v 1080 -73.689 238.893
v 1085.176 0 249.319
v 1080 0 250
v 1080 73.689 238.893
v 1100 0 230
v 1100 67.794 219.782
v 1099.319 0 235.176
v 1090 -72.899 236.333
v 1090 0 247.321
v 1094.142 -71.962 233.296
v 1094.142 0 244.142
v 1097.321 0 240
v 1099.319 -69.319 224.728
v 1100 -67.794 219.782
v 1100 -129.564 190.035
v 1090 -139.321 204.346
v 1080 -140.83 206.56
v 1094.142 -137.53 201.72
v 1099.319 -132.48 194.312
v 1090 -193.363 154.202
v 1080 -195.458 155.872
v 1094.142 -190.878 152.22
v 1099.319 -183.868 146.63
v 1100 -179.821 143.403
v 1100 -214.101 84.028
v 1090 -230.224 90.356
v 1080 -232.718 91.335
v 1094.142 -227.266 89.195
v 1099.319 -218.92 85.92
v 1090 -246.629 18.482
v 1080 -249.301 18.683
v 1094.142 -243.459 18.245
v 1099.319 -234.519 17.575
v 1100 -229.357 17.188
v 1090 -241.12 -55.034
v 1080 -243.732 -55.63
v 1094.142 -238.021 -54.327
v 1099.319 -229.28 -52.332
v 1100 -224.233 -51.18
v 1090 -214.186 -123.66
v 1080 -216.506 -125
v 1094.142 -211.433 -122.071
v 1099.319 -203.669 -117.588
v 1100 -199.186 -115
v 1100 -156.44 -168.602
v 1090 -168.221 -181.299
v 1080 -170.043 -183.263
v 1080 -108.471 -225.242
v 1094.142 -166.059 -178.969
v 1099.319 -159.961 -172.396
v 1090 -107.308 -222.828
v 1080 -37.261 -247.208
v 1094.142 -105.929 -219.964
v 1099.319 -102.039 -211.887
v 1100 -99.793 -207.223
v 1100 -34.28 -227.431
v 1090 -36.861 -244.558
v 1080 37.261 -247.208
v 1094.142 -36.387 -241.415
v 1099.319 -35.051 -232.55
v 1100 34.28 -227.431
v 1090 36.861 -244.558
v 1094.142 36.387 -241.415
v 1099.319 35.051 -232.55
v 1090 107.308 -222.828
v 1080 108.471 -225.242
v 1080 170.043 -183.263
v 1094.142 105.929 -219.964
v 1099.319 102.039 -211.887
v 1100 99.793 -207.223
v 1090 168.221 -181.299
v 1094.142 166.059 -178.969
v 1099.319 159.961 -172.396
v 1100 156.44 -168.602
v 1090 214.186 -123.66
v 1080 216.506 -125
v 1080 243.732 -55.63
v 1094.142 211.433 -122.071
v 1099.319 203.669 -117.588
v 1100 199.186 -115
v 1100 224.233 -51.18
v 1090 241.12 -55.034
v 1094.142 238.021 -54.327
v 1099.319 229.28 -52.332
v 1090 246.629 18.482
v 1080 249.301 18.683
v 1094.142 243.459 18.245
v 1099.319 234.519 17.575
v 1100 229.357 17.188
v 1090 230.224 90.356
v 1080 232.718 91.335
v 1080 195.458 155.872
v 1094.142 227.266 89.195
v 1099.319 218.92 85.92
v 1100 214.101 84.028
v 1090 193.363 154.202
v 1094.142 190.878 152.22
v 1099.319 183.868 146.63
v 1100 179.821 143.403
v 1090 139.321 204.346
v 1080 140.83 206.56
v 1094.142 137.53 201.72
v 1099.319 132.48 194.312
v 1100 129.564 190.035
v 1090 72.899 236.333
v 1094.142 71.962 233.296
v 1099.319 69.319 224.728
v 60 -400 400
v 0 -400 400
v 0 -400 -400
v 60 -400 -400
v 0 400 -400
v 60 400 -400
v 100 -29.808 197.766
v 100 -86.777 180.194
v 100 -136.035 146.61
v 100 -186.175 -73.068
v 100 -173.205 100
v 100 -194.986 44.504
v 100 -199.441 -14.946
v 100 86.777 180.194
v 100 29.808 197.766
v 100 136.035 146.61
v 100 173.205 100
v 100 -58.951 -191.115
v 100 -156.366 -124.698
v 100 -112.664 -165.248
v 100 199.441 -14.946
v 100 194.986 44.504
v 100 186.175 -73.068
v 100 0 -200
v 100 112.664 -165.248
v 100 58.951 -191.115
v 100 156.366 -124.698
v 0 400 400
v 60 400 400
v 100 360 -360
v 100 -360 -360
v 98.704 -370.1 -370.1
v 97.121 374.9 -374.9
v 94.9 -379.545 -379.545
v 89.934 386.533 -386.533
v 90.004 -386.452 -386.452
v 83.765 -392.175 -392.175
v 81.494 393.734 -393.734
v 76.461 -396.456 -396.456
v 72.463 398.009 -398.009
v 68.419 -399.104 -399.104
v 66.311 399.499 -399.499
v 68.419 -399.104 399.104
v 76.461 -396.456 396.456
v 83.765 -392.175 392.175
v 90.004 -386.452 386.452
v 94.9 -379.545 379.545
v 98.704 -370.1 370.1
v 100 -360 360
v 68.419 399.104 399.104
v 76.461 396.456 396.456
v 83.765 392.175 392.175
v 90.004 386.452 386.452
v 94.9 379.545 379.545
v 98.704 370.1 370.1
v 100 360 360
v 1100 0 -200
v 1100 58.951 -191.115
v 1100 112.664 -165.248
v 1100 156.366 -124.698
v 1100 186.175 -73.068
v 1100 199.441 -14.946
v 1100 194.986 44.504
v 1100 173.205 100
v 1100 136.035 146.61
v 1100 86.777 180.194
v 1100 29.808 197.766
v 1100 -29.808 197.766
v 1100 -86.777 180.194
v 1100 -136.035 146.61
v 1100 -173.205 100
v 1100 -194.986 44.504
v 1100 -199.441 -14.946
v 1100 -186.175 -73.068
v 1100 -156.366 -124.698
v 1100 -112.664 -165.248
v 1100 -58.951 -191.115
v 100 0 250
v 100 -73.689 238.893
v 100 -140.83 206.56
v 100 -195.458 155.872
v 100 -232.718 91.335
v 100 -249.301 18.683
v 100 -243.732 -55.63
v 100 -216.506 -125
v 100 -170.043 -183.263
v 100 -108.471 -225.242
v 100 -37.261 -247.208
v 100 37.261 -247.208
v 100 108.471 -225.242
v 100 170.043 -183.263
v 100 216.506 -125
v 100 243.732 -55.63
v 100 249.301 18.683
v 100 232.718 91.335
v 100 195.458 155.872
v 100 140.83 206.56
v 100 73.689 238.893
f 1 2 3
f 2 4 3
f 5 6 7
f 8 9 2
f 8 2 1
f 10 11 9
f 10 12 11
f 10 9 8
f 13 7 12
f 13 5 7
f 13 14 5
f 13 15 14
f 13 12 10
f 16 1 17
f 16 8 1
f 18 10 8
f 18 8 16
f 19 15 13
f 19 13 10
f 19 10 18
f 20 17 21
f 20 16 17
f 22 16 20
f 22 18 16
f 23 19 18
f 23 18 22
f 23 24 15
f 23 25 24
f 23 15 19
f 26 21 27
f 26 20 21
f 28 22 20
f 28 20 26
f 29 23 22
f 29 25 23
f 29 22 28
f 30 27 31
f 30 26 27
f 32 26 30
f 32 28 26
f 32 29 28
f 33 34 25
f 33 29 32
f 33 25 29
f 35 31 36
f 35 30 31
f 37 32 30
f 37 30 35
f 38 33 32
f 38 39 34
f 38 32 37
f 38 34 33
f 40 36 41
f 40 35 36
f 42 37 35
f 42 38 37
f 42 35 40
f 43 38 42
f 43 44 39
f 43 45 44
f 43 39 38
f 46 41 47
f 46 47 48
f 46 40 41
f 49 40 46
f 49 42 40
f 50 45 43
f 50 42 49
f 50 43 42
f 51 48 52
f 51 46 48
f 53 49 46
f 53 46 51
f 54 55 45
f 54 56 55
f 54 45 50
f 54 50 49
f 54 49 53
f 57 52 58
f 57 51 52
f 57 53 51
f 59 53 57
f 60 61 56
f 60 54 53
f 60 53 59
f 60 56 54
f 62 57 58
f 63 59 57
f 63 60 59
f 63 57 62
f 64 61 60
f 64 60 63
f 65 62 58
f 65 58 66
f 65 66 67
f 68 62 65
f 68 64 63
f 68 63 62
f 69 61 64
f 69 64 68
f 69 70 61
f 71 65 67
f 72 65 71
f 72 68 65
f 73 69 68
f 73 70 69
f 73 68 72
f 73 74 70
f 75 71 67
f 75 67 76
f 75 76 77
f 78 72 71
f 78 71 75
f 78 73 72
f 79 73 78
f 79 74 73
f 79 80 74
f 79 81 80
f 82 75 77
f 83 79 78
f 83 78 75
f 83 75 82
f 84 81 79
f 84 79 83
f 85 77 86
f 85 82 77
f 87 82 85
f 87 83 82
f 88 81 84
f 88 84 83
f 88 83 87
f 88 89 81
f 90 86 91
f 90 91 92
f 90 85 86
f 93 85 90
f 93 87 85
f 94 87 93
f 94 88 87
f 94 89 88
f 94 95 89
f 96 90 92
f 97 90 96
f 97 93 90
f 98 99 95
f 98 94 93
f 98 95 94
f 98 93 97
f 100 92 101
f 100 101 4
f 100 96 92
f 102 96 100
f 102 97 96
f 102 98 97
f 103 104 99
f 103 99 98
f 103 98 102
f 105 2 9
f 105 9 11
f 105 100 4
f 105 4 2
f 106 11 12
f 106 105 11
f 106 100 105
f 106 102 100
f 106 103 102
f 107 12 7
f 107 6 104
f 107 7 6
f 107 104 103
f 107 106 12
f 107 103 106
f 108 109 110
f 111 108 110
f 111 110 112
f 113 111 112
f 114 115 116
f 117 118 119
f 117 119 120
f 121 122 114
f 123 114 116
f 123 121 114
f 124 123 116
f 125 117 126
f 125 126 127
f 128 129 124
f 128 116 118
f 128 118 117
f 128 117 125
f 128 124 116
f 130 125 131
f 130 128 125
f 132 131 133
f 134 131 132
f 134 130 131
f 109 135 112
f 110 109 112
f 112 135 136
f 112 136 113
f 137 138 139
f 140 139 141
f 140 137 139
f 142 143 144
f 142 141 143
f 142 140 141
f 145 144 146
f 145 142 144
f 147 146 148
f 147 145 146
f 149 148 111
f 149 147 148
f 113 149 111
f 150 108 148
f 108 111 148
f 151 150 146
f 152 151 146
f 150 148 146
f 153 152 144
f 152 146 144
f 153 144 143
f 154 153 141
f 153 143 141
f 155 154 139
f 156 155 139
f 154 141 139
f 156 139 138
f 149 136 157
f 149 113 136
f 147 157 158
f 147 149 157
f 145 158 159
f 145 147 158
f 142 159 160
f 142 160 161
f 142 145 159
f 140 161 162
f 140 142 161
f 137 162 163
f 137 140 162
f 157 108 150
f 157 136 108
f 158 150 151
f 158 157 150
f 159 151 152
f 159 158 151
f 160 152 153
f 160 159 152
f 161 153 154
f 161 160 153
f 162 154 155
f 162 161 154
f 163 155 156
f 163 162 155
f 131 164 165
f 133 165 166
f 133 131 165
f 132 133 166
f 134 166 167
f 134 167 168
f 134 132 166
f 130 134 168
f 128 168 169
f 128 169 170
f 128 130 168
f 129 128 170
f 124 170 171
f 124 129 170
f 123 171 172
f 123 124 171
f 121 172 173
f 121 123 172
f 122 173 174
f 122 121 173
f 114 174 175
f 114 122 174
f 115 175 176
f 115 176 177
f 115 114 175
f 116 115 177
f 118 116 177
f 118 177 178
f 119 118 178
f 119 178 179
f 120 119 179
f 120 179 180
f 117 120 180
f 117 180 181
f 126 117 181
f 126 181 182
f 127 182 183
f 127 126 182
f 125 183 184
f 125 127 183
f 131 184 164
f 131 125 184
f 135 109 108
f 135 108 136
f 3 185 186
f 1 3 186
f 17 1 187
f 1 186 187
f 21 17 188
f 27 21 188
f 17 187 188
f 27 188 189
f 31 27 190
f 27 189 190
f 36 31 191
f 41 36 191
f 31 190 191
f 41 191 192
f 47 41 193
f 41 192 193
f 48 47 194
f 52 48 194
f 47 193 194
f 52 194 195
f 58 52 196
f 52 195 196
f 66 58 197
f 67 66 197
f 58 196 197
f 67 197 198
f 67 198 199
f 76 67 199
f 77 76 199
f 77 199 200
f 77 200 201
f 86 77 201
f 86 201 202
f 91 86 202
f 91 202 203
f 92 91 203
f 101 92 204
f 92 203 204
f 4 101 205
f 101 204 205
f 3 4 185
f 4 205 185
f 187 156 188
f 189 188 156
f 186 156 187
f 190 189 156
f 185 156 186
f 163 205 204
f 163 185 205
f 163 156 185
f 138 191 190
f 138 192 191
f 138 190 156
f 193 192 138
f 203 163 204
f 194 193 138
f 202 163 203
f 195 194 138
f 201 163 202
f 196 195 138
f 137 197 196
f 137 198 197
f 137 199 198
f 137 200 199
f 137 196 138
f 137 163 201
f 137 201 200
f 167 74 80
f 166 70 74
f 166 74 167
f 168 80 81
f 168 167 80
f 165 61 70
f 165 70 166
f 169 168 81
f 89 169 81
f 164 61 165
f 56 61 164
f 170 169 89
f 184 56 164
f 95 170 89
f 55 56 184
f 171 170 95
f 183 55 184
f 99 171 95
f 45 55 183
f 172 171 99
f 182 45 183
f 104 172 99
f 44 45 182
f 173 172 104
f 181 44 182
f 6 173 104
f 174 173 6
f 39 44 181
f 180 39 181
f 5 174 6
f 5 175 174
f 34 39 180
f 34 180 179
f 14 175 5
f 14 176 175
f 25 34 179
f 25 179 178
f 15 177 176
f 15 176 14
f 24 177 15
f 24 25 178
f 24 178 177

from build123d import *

# Parameters (mm, degrees)
SKETCH3_W           = 800
SKETCH3_H           = 800
BOSS_EXTRUDE1_DEPTH = 100
SKETCH4_R           = 250
SKETCH4_R_2         = 200
BOSS_EXTRUDE2_DEPTH = 1000
FILLET3_R           = 40
FILLET4_R           = 20


with BuildPart() as part:
    # Sketch3 → Boss-Extrude1 (new body)
    with BuildSketch(Plane(origin=(0, 0, 0), x_dir=(0, 0, -1), z_dir=(1, 0, 0))):
        Rectangle(SKETCH3_W, SKETCH3_H)
    extrude(amount=BOSS_EXTRUDE1_DEPTH)

    # Sketch4 → Boss-Extrude2 (add)
    with BuildSketch(Plane(origin=(100, 0, 0), x_dir=(0, 0, -1), z_dir=(1, 0, 0))):
        with Locations(Location((0, 0, 0), (0, 0, 180))):
            Circle(SKETCH4_R)
        Circle(SKETCH4_R_2, mode=Mode.SUBTRACT)
    extrude(amount=BOSS_EXTRUDE2_DEPTH)

    # Fillet3
    fillet3_edges = [part.edges().sort_by_distance(p)[0] for p in [
        (100, 0, 400),
        (100, -400, 0),
        (100, 0, -400),
        (100, 400, 0),
    ]]
    fillet(fillet3_edges, radius=FILLET3_R)

    # Fillet4
    fillet4_edges = [part.edges().sort_by_distance(p)[0] for p in [
        (1100, 0, -250),
    ]]
    fillet(fillet4_edges, radius=FILLET4_R)


solid = part.part
